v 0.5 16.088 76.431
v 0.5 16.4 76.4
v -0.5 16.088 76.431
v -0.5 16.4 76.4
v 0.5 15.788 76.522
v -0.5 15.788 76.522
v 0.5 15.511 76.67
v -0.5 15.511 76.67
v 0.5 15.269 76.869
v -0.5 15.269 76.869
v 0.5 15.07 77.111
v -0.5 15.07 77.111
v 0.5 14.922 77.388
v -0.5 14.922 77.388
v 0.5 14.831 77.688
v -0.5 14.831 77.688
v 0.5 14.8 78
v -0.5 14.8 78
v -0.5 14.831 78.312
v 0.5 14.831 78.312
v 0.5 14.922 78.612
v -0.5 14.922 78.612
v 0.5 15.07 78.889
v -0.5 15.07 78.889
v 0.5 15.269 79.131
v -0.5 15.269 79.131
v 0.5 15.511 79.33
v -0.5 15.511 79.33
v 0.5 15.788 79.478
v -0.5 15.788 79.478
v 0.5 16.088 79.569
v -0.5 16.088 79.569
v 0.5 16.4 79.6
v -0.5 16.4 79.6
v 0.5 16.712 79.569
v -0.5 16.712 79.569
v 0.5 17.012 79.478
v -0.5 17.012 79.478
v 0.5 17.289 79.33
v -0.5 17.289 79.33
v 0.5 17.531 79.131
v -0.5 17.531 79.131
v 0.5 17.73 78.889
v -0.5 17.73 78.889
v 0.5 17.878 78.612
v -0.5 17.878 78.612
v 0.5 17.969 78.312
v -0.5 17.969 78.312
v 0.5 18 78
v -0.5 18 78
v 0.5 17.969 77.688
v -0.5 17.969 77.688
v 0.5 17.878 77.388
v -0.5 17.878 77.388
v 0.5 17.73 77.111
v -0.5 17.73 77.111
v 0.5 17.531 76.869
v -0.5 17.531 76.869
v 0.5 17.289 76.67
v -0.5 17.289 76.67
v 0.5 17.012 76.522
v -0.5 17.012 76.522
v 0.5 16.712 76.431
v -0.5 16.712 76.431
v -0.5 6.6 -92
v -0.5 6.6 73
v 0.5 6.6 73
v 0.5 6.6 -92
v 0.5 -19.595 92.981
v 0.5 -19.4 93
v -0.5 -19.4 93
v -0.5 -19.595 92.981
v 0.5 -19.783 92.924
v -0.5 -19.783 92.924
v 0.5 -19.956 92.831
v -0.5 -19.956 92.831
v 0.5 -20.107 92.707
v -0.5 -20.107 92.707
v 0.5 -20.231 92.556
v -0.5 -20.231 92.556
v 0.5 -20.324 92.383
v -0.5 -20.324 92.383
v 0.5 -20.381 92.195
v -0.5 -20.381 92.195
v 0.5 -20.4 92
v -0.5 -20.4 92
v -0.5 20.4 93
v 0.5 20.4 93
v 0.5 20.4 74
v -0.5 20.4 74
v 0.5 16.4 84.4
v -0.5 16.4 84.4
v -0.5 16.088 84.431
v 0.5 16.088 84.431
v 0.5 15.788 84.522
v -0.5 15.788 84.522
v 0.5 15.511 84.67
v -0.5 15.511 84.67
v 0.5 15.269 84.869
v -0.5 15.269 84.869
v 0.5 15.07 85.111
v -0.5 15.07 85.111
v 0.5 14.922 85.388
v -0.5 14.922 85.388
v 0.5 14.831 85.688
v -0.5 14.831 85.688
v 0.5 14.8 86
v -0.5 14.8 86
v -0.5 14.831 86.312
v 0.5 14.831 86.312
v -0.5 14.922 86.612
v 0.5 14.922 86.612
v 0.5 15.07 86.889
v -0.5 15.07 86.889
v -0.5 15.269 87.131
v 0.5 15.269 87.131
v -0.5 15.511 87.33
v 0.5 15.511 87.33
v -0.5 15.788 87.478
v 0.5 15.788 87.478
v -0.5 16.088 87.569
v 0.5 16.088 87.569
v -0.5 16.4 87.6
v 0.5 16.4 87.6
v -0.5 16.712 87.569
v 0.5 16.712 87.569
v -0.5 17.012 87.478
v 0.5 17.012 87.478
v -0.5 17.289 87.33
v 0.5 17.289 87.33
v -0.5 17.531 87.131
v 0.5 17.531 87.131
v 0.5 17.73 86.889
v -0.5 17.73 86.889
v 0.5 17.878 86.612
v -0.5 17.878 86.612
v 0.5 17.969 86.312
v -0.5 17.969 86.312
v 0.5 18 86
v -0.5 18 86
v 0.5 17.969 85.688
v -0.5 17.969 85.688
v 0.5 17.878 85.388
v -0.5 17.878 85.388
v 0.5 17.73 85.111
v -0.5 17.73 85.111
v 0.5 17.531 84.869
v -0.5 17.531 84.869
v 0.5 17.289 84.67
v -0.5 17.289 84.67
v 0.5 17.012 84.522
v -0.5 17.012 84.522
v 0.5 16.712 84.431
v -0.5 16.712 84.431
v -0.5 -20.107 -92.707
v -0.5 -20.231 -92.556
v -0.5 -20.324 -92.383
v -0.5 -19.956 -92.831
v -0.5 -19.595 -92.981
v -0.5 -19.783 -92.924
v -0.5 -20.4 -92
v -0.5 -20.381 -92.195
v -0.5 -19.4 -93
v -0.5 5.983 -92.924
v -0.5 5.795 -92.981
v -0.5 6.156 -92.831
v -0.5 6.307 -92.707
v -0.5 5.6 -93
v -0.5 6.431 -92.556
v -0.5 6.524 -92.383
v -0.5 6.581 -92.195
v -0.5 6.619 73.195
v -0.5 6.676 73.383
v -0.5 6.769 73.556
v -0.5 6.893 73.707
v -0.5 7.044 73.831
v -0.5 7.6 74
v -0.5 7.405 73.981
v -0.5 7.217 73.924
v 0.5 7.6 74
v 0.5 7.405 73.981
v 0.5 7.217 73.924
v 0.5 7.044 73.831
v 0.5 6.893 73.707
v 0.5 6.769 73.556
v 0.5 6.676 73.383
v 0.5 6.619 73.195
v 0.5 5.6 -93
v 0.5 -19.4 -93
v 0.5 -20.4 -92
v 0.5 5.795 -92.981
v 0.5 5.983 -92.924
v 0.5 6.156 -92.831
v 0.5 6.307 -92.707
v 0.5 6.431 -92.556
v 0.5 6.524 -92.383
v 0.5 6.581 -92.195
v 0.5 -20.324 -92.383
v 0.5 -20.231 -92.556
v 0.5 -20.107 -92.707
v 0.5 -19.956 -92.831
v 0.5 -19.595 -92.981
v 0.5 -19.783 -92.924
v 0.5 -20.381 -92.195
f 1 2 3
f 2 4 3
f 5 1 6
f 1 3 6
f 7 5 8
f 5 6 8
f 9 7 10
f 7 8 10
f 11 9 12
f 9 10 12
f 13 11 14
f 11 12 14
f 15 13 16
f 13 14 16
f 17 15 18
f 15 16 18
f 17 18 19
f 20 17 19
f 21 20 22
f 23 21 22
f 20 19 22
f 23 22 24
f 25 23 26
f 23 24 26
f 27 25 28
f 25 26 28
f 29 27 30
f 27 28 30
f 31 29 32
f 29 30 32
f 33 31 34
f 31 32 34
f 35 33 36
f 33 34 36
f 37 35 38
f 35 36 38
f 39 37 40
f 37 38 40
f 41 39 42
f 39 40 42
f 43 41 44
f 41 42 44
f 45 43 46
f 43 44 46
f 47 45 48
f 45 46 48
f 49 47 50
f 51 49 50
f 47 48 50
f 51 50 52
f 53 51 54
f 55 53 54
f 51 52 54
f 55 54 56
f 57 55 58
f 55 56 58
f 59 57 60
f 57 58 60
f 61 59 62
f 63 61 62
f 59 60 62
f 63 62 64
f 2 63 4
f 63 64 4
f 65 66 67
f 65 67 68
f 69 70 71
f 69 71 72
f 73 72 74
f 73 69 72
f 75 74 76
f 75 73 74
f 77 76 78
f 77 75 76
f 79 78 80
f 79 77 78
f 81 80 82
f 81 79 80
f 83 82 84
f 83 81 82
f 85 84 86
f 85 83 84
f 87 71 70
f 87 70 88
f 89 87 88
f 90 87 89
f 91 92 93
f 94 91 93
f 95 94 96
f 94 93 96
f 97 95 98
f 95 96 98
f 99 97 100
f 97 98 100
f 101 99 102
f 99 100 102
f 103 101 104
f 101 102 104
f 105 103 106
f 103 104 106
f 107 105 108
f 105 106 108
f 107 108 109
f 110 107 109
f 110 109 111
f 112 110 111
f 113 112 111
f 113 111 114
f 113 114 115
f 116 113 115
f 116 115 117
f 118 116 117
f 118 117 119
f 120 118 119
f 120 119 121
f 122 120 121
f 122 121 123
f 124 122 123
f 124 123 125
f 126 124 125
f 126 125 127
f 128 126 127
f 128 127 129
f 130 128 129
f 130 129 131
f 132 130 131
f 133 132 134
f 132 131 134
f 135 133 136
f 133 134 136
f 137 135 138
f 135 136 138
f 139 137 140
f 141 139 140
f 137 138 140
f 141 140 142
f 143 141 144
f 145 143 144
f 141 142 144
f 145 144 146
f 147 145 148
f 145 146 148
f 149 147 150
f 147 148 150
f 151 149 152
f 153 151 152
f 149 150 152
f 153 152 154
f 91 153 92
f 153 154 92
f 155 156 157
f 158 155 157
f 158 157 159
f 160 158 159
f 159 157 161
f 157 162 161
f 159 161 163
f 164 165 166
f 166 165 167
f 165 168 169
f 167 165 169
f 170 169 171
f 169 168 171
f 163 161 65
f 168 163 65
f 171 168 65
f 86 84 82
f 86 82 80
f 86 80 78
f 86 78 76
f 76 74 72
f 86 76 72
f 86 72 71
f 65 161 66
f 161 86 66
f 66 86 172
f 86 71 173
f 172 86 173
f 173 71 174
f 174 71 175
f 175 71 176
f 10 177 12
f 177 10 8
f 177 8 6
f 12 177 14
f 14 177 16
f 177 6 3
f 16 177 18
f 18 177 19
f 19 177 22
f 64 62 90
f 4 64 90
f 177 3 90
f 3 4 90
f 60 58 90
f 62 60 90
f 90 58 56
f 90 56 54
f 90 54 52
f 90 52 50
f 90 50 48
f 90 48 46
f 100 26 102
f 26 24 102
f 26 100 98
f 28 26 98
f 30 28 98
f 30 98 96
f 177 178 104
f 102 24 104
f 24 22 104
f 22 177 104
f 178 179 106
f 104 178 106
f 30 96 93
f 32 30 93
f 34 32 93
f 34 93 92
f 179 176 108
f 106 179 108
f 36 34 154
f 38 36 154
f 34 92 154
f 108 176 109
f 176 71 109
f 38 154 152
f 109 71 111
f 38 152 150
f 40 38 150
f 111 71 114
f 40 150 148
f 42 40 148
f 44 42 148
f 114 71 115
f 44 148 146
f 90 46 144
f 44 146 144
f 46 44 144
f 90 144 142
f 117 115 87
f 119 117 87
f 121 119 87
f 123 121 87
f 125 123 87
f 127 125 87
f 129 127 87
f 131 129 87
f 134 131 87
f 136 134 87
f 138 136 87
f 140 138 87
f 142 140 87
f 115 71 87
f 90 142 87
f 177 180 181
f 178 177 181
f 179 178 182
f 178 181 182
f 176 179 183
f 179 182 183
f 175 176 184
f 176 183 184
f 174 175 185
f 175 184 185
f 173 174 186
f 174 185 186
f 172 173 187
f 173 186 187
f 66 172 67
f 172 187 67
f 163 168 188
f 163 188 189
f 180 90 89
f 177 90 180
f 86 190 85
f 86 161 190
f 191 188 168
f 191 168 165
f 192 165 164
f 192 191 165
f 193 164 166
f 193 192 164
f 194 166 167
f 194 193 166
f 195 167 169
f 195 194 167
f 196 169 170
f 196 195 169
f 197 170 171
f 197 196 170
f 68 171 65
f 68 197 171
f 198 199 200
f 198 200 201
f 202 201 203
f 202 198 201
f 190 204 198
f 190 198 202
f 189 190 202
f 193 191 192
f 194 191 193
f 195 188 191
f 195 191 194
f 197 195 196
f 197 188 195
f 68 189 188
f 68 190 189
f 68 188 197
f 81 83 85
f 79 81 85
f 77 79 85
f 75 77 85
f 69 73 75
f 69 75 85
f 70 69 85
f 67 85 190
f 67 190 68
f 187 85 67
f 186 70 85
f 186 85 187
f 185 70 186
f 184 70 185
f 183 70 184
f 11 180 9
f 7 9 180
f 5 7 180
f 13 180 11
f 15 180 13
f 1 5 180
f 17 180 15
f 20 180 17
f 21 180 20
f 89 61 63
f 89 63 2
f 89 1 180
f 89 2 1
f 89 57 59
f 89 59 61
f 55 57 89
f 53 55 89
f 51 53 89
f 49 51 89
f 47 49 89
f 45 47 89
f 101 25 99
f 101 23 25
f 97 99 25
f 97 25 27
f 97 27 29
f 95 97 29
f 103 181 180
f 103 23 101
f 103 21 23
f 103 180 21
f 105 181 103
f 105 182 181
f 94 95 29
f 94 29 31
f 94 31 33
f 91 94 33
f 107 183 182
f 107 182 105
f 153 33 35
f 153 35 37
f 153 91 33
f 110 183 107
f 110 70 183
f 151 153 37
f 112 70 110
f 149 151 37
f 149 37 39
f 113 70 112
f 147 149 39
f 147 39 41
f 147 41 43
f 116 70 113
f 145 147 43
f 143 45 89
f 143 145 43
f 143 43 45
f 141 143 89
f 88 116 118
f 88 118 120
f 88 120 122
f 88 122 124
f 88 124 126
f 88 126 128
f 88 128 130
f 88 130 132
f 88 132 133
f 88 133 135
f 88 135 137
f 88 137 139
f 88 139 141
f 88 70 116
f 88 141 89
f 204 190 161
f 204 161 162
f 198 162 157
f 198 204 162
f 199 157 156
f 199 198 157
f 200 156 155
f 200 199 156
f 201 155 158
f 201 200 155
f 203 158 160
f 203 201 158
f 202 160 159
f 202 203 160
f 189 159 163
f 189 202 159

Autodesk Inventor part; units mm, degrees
ref_plane "YZ Plane" through (0, 0, 0) normal (1, 0, 0) x (0, 1, 0)
ref_plane "XZ Plane" through (0, 0, 0) normal (0, 1, 0) x (-1, 0, 0)
ref_plane "XY Plane" through (0, 0, 0) normal (0, 0, 1) x (1, 0, 0)
sketch "スケッチ1" plane through (0, 0, 0) normal (1, 0, 0) x (0, 1, 0)
  line L0 (-20.4, 93) -> (20.4, 93)
  line L1 (20.4, 93) -> (20.4, -93)
  line L2 (20.4, -93) -> (-20.4, -93)
  line L3 (-20.4, -93) -> (-20.4, 93)
  line L4 (-20.4, 93) -> (20.4, -93) construction
  line L5 (20.4, 93) -> (-20.4, -93) construction
  point P0 (0, 0)
  dimension "d0" = 40.8
  dimension "d1" = 186
extrude "プレート1" add sketch "スケッチ1" along normal mid plane 1
sketch "スケッチ2" plane through (0.5, 0, 0) normal (1, 0, 0) x (0, 0, -1)
  line L0 (-93, 20.4) -> (93, 20.4) projected
  line L1 (-93, -20.4) -> (-93, 20.4) projected
  point P0 (0, 0)
  point P1 (-86, 16.4)
  point P2 (-78, 16.4)
  dimension "d3" = 4
  dimension "d4" = 7
  dimension "d5" = 8
hole "穴1" at (0.5, 16.4, 86) at (0.5, 16.4, 78) direction (-1, 0, 0) diameter 3.2 end through all clearance for "Socket Head Cap Screw" size "M3" standard "Ansi Metric M Profile"
sketch "スケッチ3" plane through (-0.5, 0, 0) normal (-1, 0, 0) x (0, 0, 1)
  line L0 (-93, 20.4) -> (-93, -20.4) projected
  line L1 (-93, 20.4) -> (74, 20.4)
  line L2 (74, 20.4) -> (74, 6.6)
  line L3 (74, 6.6) -> (-93, 6.6)
  line L4 (-93, 6.6) -> (-93, 20.4)
  line L5 (-93, -20.4) -> (93, -20.4) projected
  line L6 (93, -20.4) -> (93, 20.4) projected
  point P0 (0, 0)
  point P1 (-93, 6.6)
  dimension "d14" = 19
  dimension "d18" = 13.8
extrude "押し出し1" cut sketch "スケッチ3" against normal blind 10
fillet "コーナーR1" radius 1 4 edges at (0, -20.4, 93) (0, -20.4, -93) (0, 6.6, -93) (0, 6.6, 74)
equation "\"d11\" = Thickness"
equation "\"d2\" = Thickness"
equation "\"BendRadius\" = Thickness"
equation "\"BendReliefWidth\" = Thickness"
equation "\"BendReliefDepth\" = 0.5 * Thickness"
equation "\"CornerReliefSize\" = 4 * Thickness"
equation "\"MinimumRemnant\" = 2 * Thickness"
equation "\"TransitionRadius\" = BendRadius"
equation "\"JacobiRadiusSize\" = BendRadius"
equation "\"GapSize\" = Thickness"
equation "\"Thickness\" = 1"
properties part number "s_carbon_plate2" material "CFRP"
